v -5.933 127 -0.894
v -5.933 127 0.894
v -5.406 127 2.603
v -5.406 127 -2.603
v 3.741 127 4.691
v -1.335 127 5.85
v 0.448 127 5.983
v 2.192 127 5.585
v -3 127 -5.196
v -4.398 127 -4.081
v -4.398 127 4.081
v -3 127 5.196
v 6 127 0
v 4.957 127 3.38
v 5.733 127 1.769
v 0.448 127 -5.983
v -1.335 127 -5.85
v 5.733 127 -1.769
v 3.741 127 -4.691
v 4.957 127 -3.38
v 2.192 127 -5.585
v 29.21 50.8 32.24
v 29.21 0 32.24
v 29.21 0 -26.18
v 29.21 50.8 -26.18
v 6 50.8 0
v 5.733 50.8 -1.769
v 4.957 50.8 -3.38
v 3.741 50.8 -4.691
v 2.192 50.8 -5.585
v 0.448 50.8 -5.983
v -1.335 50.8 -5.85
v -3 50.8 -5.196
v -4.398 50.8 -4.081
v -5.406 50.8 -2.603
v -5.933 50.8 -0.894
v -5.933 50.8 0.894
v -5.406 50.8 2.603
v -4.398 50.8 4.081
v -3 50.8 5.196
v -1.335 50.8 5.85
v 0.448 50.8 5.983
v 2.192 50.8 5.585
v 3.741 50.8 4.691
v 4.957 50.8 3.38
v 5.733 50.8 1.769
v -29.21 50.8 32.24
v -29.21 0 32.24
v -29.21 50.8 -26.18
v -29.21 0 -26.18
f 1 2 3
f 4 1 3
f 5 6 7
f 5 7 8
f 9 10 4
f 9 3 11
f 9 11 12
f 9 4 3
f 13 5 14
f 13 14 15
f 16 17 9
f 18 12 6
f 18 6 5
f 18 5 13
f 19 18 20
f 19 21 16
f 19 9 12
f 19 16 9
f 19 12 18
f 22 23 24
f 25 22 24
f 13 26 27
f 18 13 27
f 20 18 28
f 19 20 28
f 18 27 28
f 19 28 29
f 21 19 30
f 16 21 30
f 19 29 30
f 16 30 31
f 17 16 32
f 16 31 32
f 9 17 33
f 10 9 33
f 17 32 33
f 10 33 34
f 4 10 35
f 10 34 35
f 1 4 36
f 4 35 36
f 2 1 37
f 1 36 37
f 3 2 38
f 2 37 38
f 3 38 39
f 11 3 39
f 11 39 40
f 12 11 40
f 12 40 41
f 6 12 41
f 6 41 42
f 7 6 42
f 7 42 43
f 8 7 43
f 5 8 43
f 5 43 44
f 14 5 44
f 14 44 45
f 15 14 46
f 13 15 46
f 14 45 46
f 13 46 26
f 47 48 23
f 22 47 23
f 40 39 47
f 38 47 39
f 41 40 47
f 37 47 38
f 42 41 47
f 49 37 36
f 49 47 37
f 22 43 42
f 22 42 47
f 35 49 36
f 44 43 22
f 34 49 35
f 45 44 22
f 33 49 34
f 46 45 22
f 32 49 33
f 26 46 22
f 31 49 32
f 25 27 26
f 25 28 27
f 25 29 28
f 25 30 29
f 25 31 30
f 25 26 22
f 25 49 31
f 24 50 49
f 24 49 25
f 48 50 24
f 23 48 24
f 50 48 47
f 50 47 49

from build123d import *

# Parameters (mm, degrees)
SKETCH1_W           = 58.42
SKETCH1_H           = 58.42
BOSS_EXTRUDE1_DEPTH = 50.8
SKETCH2_R           = 6
BOSS_EXTRUDE2_DEPTH = 76.2


with BuildPart() as part:
    # Sketch1 → Boss-Extrude1 (new body)
    with BuildSketch(Plane(origin=(0, 0, 0), x_dir=(1, 0, 0), z_dir=(0, 1, 0))):
        with Locations((0, -3.030175439)):
            Rectangle(SKETCH1_W, SKETCH1_H)
    extrude(amount=BOSS_EXTRUDE1_DEPTH)

    # Sketch2 → Boss-Extrude2 (add)
    with BuildSketch(Plane(origin=(0, 50.8, 0), x_dir=(1, 0, 0), z_dir=(0, 1, 0))):
        Circle(SKETCH2_R)
    extrude(amount=BOSS_EXTRUDE2_DEPTH)


solid = part.part
